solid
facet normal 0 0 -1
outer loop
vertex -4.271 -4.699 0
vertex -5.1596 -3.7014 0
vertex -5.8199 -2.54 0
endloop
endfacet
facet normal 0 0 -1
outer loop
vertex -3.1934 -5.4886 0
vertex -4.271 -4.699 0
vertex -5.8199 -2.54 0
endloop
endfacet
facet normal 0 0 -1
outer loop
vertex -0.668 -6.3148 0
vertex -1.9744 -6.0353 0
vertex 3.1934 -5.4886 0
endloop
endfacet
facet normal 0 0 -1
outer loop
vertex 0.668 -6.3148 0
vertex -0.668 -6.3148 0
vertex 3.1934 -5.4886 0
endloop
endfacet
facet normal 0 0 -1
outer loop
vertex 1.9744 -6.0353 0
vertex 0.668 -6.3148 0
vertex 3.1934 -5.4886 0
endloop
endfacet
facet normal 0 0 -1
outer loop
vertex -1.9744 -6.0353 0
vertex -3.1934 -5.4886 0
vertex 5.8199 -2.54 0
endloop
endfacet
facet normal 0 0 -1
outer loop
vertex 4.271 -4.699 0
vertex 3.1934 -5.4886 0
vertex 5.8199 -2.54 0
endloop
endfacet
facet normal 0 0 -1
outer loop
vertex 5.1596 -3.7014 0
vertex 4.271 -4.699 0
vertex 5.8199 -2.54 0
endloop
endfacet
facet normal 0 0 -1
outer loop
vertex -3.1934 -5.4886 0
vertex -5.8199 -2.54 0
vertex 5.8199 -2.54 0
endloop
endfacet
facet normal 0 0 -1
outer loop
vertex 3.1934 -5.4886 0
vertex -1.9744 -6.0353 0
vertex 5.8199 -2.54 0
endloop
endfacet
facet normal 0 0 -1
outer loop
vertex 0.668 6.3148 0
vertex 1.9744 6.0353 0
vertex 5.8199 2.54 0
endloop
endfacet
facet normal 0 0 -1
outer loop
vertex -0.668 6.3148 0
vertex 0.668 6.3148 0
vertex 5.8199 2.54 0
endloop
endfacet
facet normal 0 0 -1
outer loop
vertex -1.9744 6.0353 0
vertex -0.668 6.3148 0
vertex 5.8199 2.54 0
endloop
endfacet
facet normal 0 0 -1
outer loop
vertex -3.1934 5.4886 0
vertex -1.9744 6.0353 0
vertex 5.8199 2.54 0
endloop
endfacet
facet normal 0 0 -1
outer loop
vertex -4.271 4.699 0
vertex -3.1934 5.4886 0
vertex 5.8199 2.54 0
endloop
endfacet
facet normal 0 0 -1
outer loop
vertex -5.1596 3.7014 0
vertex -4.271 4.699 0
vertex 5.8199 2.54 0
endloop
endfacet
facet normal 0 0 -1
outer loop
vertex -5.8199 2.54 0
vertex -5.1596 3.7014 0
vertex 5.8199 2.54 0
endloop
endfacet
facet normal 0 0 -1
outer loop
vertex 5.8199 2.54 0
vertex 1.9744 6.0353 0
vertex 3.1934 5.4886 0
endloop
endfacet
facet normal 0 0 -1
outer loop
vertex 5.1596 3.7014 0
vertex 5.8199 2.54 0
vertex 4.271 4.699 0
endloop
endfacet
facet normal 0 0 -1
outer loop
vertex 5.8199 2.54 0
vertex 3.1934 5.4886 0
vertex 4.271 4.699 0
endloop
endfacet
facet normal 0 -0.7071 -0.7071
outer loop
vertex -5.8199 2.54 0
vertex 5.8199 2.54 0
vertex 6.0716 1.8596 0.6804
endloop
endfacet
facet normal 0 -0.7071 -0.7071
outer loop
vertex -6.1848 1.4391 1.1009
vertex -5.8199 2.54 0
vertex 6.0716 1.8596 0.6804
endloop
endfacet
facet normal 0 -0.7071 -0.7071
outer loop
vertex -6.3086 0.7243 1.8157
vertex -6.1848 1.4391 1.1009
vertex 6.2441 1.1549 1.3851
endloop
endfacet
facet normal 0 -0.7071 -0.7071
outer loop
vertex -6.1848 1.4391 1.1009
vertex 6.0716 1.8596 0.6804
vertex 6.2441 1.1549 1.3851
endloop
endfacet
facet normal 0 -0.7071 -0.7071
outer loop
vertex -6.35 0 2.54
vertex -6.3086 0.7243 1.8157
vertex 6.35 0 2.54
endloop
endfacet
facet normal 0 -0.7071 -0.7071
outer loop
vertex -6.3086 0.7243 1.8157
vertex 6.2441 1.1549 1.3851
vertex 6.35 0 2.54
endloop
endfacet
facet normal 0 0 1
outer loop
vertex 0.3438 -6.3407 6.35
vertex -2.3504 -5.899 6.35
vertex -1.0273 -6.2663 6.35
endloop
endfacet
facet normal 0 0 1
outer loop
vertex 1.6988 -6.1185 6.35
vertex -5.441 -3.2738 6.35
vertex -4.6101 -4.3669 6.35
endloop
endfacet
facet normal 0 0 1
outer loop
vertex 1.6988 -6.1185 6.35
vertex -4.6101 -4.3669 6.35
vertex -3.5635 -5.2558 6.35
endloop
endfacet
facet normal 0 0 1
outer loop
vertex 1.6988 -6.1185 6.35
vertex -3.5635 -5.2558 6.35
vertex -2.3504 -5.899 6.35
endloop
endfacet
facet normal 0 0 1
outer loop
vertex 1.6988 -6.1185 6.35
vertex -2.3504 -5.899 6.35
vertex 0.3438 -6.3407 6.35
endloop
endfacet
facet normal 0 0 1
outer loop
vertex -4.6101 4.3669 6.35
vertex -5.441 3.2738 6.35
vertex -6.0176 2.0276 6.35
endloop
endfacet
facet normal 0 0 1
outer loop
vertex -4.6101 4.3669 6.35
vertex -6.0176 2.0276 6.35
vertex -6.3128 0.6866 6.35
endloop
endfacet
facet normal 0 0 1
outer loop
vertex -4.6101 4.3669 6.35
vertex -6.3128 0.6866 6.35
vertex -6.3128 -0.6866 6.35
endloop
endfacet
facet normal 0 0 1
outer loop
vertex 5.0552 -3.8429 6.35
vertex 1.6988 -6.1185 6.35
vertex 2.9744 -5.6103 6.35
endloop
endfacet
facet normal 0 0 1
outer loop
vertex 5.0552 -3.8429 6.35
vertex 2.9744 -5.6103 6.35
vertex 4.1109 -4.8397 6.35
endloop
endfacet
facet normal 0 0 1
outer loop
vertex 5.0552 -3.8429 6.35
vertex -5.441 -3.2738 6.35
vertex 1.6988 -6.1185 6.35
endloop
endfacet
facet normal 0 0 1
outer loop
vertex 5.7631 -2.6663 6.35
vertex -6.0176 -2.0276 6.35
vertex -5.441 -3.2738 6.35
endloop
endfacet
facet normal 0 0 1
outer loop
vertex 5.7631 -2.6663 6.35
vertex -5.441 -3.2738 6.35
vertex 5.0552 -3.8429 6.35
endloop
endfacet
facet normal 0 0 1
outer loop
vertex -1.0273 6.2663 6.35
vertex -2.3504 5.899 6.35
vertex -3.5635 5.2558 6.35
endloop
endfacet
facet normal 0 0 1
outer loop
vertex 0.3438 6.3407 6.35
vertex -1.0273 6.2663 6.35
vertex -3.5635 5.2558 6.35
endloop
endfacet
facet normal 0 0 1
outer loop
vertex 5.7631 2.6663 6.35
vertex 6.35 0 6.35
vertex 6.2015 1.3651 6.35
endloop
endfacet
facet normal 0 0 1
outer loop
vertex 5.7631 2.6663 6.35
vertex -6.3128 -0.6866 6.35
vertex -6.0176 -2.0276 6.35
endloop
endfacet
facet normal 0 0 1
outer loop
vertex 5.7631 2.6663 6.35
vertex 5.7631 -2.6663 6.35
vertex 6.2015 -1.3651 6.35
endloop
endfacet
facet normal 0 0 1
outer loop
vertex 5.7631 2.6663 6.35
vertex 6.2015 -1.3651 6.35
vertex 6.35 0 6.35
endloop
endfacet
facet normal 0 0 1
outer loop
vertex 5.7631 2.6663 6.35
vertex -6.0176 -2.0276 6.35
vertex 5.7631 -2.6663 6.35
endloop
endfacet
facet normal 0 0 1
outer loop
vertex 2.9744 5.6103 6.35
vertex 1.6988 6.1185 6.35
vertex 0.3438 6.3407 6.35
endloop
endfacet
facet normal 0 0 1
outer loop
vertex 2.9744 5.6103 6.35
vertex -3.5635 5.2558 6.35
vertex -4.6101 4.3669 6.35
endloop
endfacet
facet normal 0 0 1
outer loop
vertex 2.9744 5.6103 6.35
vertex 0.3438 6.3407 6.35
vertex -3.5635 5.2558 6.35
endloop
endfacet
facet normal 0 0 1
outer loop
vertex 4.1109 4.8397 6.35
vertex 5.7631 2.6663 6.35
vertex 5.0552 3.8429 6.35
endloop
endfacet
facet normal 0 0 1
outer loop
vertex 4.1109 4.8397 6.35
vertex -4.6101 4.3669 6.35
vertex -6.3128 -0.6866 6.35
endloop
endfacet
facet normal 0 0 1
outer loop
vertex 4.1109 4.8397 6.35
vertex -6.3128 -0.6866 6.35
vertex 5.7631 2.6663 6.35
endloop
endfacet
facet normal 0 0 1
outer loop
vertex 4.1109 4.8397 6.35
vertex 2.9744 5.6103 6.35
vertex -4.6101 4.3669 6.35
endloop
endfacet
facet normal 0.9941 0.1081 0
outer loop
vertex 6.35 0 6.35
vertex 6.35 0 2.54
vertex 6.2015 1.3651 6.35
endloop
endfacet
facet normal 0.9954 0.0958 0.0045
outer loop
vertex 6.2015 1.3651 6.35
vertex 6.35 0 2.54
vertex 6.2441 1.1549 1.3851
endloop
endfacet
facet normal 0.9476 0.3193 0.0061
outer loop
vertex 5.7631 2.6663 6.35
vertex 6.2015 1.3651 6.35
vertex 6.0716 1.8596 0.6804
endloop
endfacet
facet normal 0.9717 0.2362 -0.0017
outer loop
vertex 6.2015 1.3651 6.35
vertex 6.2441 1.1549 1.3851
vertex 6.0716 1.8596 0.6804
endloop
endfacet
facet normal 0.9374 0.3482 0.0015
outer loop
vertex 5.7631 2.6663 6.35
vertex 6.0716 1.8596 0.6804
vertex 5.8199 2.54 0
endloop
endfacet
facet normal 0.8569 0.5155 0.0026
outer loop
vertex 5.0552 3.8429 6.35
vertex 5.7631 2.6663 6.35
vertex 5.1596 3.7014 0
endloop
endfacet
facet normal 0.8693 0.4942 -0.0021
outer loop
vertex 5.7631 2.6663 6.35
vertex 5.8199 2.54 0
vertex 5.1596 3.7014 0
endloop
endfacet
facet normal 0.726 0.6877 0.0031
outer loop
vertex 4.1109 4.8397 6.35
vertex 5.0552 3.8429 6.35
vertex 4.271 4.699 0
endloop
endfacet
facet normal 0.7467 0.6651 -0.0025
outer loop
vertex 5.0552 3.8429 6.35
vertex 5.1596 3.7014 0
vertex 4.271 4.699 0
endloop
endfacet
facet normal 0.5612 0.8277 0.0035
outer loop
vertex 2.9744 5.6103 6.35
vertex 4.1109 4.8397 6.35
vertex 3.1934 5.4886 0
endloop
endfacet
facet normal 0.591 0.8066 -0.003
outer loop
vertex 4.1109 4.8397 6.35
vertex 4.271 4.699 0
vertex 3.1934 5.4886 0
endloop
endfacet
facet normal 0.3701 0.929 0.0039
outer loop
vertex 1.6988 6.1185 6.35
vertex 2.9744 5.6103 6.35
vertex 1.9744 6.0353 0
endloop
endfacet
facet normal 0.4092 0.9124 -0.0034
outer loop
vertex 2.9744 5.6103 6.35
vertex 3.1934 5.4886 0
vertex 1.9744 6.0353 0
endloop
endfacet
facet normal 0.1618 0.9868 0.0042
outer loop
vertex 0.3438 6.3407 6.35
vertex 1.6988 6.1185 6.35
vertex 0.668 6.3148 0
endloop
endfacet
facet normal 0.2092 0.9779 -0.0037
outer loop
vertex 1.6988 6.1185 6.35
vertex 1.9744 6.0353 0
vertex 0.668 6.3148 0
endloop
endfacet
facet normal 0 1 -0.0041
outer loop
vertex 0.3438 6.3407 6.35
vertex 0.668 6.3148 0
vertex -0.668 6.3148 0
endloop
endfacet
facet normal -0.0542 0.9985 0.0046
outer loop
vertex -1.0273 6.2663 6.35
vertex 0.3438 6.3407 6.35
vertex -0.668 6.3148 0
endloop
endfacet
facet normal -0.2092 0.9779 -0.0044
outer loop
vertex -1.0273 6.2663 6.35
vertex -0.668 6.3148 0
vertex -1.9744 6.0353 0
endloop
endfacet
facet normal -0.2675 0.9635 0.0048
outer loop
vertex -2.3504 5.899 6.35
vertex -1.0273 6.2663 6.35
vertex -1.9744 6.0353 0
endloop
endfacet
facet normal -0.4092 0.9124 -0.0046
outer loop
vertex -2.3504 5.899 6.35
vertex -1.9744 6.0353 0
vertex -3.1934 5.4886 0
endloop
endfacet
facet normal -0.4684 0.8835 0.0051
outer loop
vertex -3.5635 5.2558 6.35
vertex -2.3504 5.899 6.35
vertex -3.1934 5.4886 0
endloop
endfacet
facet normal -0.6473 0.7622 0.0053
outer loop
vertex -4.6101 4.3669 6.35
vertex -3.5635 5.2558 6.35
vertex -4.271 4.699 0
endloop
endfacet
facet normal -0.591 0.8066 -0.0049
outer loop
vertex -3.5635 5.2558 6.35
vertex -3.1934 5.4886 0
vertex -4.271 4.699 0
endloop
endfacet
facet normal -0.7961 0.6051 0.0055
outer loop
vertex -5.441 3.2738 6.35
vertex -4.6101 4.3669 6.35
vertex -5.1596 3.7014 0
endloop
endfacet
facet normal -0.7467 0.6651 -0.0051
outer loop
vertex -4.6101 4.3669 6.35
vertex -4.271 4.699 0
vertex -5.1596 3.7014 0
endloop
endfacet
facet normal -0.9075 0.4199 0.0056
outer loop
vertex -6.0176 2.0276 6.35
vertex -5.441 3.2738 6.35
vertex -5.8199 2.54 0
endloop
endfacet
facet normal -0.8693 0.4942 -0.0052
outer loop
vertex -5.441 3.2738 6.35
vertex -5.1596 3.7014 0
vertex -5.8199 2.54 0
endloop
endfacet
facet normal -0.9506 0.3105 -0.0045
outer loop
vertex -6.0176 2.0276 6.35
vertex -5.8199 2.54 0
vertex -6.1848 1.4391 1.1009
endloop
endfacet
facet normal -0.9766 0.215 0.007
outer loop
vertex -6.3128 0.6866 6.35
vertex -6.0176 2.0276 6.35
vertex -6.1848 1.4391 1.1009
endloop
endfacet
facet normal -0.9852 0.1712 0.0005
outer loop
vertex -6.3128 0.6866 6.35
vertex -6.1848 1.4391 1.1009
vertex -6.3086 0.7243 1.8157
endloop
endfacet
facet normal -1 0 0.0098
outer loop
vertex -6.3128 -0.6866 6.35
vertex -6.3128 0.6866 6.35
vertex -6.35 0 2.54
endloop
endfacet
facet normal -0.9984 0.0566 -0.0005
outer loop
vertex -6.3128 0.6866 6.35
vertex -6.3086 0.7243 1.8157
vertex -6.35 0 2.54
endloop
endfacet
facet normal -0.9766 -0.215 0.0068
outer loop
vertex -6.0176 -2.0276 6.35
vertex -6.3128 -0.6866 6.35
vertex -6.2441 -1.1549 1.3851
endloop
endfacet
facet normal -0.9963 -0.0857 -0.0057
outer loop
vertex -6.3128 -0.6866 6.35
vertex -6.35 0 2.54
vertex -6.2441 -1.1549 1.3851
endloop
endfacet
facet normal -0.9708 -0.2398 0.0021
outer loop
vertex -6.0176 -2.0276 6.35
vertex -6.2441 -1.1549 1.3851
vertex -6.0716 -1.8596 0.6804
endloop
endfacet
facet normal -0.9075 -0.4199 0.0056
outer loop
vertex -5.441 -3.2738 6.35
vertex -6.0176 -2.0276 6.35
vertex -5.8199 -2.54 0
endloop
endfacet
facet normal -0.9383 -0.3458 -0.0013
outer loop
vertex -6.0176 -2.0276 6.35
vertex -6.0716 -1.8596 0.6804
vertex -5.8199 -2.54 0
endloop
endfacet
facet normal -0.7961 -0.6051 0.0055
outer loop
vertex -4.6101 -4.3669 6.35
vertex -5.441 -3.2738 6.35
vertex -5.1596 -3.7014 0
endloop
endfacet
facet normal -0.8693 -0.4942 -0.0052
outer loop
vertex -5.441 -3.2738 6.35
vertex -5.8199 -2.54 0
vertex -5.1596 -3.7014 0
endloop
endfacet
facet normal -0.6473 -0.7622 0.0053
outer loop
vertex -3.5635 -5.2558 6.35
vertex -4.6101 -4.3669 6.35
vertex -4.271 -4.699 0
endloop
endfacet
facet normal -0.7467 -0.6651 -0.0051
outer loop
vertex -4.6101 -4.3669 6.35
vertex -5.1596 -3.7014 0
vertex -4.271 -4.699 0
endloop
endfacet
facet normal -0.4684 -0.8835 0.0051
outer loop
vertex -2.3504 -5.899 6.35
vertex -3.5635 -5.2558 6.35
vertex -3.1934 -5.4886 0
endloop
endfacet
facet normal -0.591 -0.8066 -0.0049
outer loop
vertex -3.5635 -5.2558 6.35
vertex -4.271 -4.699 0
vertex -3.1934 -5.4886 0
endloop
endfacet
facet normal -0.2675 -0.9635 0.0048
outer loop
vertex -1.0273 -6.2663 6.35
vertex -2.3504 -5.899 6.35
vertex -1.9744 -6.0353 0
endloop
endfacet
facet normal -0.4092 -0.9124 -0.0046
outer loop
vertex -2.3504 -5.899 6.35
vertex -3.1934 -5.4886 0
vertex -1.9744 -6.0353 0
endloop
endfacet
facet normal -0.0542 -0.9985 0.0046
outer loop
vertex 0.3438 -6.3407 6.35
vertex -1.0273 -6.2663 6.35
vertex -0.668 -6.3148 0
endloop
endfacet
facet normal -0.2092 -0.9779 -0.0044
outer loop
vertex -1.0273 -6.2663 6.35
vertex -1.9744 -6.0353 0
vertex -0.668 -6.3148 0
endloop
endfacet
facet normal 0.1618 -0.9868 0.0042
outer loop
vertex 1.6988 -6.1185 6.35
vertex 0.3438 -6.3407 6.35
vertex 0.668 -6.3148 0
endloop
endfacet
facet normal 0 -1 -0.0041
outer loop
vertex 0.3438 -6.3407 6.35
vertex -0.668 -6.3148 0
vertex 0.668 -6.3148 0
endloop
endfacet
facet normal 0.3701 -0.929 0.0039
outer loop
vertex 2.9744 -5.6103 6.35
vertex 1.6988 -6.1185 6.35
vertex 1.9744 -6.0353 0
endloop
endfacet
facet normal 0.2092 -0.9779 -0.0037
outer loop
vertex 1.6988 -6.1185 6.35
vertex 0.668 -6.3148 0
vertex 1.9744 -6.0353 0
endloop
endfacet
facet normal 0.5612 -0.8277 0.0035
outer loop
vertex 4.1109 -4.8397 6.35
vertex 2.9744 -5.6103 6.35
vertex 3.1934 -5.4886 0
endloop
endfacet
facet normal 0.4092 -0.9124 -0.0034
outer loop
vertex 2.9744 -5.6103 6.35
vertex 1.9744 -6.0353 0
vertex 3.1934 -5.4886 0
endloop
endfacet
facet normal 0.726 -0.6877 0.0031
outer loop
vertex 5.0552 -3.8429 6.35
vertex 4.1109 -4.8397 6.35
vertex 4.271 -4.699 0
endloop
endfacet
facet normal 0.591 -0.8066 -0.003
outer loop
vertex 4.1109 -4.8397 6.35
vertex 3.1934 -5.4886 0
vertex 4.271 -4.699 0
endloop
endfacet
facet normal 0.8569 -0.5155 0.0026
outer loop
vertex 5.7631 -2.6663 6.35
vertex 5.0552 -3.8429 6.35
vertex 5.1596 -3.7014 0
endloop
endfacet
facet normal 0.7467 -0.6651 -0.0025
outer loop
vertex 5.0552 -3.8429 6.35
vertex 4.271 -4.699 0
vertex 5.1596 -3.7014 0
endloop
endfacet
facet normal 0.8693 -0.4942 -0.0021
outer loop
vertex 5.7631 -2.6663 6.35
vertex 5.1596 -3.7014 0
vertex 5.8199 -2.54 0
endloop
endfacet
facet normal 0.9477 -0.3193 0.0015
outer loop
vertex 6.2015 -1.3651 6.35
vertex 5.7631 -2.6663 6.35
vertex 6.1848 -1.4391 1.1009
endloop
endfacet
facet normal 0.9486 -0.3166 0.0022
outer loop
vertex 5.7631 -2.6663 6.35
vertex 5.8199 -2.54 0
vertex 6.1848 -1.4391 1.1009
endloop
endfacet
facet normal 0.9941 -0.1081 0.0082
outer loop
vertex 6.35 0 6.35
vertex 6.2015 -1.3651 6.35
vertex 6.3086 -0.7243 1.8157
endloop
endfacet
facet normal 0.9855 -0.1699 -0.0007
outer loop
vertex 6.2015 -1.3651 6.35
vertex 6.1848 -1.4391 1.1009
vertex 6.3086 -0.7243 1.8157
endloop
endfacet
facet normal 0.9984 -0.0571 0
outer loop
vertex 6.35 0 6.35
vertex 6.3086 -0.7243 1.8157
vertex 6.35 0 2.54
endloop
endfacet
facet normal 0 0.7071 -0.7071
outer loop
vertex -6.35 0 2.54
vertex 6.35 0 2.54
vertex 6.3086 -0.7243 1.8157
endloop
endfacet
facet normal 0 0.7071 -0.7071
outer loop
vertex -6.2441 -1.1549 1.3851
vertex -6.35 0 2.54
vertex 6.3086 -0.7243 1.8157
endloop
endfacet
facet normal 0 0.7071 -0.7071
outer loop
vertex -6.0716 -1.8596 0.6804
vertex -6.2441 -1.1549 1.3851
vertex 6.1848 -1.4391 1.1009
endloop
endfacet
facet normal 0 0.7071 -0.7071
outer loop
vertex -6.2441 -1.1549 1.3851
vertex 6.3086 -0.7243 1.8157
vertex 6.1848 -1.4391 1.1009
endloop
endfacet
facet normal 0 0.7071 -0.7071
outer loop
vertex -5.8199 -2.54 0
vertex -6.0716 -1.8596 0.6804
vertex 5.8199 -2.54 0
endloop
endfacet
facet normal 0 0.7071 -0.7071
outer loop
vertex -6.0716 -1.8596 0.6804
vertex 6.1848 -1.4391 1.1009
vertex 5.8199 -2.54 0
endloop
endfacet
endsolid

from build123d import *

# Parameters (mm, degrees)
F0_R     = 6.35
F1_DEPTH = 6.35
F2_R     = 1.27
F7_DEPTH = 12.7


with BuildPart() as f1:
    # F0 (on Top) → F1 (new body)
    with BuildSketch(Plane.XY):
        Circle(F0_R)
    extrude(amount=F1_DEPTH)

    # F2 (on Top) → F5 section 0
    with BuildSketch(Plane.XY, mode=Mode.PRIVATE) as f5_s0:
        Circle(F2_R)
    loft([Vertex(0, 0, -2.54), f5_s0.sketch], mode=Mode.SUBTRACT)

    # F6 (on Right) → F7 (cut, symmetric)
    with BuildSketch(Plane.YZ):
        Polygon((0, -2.54), (2.54, 0), (0, 2.54), (-2.54, 0), align=None)
    extrude(amount=F7_DEPTH, both=True, mode=Mode.SUBTRACT)


solid = f1.part
